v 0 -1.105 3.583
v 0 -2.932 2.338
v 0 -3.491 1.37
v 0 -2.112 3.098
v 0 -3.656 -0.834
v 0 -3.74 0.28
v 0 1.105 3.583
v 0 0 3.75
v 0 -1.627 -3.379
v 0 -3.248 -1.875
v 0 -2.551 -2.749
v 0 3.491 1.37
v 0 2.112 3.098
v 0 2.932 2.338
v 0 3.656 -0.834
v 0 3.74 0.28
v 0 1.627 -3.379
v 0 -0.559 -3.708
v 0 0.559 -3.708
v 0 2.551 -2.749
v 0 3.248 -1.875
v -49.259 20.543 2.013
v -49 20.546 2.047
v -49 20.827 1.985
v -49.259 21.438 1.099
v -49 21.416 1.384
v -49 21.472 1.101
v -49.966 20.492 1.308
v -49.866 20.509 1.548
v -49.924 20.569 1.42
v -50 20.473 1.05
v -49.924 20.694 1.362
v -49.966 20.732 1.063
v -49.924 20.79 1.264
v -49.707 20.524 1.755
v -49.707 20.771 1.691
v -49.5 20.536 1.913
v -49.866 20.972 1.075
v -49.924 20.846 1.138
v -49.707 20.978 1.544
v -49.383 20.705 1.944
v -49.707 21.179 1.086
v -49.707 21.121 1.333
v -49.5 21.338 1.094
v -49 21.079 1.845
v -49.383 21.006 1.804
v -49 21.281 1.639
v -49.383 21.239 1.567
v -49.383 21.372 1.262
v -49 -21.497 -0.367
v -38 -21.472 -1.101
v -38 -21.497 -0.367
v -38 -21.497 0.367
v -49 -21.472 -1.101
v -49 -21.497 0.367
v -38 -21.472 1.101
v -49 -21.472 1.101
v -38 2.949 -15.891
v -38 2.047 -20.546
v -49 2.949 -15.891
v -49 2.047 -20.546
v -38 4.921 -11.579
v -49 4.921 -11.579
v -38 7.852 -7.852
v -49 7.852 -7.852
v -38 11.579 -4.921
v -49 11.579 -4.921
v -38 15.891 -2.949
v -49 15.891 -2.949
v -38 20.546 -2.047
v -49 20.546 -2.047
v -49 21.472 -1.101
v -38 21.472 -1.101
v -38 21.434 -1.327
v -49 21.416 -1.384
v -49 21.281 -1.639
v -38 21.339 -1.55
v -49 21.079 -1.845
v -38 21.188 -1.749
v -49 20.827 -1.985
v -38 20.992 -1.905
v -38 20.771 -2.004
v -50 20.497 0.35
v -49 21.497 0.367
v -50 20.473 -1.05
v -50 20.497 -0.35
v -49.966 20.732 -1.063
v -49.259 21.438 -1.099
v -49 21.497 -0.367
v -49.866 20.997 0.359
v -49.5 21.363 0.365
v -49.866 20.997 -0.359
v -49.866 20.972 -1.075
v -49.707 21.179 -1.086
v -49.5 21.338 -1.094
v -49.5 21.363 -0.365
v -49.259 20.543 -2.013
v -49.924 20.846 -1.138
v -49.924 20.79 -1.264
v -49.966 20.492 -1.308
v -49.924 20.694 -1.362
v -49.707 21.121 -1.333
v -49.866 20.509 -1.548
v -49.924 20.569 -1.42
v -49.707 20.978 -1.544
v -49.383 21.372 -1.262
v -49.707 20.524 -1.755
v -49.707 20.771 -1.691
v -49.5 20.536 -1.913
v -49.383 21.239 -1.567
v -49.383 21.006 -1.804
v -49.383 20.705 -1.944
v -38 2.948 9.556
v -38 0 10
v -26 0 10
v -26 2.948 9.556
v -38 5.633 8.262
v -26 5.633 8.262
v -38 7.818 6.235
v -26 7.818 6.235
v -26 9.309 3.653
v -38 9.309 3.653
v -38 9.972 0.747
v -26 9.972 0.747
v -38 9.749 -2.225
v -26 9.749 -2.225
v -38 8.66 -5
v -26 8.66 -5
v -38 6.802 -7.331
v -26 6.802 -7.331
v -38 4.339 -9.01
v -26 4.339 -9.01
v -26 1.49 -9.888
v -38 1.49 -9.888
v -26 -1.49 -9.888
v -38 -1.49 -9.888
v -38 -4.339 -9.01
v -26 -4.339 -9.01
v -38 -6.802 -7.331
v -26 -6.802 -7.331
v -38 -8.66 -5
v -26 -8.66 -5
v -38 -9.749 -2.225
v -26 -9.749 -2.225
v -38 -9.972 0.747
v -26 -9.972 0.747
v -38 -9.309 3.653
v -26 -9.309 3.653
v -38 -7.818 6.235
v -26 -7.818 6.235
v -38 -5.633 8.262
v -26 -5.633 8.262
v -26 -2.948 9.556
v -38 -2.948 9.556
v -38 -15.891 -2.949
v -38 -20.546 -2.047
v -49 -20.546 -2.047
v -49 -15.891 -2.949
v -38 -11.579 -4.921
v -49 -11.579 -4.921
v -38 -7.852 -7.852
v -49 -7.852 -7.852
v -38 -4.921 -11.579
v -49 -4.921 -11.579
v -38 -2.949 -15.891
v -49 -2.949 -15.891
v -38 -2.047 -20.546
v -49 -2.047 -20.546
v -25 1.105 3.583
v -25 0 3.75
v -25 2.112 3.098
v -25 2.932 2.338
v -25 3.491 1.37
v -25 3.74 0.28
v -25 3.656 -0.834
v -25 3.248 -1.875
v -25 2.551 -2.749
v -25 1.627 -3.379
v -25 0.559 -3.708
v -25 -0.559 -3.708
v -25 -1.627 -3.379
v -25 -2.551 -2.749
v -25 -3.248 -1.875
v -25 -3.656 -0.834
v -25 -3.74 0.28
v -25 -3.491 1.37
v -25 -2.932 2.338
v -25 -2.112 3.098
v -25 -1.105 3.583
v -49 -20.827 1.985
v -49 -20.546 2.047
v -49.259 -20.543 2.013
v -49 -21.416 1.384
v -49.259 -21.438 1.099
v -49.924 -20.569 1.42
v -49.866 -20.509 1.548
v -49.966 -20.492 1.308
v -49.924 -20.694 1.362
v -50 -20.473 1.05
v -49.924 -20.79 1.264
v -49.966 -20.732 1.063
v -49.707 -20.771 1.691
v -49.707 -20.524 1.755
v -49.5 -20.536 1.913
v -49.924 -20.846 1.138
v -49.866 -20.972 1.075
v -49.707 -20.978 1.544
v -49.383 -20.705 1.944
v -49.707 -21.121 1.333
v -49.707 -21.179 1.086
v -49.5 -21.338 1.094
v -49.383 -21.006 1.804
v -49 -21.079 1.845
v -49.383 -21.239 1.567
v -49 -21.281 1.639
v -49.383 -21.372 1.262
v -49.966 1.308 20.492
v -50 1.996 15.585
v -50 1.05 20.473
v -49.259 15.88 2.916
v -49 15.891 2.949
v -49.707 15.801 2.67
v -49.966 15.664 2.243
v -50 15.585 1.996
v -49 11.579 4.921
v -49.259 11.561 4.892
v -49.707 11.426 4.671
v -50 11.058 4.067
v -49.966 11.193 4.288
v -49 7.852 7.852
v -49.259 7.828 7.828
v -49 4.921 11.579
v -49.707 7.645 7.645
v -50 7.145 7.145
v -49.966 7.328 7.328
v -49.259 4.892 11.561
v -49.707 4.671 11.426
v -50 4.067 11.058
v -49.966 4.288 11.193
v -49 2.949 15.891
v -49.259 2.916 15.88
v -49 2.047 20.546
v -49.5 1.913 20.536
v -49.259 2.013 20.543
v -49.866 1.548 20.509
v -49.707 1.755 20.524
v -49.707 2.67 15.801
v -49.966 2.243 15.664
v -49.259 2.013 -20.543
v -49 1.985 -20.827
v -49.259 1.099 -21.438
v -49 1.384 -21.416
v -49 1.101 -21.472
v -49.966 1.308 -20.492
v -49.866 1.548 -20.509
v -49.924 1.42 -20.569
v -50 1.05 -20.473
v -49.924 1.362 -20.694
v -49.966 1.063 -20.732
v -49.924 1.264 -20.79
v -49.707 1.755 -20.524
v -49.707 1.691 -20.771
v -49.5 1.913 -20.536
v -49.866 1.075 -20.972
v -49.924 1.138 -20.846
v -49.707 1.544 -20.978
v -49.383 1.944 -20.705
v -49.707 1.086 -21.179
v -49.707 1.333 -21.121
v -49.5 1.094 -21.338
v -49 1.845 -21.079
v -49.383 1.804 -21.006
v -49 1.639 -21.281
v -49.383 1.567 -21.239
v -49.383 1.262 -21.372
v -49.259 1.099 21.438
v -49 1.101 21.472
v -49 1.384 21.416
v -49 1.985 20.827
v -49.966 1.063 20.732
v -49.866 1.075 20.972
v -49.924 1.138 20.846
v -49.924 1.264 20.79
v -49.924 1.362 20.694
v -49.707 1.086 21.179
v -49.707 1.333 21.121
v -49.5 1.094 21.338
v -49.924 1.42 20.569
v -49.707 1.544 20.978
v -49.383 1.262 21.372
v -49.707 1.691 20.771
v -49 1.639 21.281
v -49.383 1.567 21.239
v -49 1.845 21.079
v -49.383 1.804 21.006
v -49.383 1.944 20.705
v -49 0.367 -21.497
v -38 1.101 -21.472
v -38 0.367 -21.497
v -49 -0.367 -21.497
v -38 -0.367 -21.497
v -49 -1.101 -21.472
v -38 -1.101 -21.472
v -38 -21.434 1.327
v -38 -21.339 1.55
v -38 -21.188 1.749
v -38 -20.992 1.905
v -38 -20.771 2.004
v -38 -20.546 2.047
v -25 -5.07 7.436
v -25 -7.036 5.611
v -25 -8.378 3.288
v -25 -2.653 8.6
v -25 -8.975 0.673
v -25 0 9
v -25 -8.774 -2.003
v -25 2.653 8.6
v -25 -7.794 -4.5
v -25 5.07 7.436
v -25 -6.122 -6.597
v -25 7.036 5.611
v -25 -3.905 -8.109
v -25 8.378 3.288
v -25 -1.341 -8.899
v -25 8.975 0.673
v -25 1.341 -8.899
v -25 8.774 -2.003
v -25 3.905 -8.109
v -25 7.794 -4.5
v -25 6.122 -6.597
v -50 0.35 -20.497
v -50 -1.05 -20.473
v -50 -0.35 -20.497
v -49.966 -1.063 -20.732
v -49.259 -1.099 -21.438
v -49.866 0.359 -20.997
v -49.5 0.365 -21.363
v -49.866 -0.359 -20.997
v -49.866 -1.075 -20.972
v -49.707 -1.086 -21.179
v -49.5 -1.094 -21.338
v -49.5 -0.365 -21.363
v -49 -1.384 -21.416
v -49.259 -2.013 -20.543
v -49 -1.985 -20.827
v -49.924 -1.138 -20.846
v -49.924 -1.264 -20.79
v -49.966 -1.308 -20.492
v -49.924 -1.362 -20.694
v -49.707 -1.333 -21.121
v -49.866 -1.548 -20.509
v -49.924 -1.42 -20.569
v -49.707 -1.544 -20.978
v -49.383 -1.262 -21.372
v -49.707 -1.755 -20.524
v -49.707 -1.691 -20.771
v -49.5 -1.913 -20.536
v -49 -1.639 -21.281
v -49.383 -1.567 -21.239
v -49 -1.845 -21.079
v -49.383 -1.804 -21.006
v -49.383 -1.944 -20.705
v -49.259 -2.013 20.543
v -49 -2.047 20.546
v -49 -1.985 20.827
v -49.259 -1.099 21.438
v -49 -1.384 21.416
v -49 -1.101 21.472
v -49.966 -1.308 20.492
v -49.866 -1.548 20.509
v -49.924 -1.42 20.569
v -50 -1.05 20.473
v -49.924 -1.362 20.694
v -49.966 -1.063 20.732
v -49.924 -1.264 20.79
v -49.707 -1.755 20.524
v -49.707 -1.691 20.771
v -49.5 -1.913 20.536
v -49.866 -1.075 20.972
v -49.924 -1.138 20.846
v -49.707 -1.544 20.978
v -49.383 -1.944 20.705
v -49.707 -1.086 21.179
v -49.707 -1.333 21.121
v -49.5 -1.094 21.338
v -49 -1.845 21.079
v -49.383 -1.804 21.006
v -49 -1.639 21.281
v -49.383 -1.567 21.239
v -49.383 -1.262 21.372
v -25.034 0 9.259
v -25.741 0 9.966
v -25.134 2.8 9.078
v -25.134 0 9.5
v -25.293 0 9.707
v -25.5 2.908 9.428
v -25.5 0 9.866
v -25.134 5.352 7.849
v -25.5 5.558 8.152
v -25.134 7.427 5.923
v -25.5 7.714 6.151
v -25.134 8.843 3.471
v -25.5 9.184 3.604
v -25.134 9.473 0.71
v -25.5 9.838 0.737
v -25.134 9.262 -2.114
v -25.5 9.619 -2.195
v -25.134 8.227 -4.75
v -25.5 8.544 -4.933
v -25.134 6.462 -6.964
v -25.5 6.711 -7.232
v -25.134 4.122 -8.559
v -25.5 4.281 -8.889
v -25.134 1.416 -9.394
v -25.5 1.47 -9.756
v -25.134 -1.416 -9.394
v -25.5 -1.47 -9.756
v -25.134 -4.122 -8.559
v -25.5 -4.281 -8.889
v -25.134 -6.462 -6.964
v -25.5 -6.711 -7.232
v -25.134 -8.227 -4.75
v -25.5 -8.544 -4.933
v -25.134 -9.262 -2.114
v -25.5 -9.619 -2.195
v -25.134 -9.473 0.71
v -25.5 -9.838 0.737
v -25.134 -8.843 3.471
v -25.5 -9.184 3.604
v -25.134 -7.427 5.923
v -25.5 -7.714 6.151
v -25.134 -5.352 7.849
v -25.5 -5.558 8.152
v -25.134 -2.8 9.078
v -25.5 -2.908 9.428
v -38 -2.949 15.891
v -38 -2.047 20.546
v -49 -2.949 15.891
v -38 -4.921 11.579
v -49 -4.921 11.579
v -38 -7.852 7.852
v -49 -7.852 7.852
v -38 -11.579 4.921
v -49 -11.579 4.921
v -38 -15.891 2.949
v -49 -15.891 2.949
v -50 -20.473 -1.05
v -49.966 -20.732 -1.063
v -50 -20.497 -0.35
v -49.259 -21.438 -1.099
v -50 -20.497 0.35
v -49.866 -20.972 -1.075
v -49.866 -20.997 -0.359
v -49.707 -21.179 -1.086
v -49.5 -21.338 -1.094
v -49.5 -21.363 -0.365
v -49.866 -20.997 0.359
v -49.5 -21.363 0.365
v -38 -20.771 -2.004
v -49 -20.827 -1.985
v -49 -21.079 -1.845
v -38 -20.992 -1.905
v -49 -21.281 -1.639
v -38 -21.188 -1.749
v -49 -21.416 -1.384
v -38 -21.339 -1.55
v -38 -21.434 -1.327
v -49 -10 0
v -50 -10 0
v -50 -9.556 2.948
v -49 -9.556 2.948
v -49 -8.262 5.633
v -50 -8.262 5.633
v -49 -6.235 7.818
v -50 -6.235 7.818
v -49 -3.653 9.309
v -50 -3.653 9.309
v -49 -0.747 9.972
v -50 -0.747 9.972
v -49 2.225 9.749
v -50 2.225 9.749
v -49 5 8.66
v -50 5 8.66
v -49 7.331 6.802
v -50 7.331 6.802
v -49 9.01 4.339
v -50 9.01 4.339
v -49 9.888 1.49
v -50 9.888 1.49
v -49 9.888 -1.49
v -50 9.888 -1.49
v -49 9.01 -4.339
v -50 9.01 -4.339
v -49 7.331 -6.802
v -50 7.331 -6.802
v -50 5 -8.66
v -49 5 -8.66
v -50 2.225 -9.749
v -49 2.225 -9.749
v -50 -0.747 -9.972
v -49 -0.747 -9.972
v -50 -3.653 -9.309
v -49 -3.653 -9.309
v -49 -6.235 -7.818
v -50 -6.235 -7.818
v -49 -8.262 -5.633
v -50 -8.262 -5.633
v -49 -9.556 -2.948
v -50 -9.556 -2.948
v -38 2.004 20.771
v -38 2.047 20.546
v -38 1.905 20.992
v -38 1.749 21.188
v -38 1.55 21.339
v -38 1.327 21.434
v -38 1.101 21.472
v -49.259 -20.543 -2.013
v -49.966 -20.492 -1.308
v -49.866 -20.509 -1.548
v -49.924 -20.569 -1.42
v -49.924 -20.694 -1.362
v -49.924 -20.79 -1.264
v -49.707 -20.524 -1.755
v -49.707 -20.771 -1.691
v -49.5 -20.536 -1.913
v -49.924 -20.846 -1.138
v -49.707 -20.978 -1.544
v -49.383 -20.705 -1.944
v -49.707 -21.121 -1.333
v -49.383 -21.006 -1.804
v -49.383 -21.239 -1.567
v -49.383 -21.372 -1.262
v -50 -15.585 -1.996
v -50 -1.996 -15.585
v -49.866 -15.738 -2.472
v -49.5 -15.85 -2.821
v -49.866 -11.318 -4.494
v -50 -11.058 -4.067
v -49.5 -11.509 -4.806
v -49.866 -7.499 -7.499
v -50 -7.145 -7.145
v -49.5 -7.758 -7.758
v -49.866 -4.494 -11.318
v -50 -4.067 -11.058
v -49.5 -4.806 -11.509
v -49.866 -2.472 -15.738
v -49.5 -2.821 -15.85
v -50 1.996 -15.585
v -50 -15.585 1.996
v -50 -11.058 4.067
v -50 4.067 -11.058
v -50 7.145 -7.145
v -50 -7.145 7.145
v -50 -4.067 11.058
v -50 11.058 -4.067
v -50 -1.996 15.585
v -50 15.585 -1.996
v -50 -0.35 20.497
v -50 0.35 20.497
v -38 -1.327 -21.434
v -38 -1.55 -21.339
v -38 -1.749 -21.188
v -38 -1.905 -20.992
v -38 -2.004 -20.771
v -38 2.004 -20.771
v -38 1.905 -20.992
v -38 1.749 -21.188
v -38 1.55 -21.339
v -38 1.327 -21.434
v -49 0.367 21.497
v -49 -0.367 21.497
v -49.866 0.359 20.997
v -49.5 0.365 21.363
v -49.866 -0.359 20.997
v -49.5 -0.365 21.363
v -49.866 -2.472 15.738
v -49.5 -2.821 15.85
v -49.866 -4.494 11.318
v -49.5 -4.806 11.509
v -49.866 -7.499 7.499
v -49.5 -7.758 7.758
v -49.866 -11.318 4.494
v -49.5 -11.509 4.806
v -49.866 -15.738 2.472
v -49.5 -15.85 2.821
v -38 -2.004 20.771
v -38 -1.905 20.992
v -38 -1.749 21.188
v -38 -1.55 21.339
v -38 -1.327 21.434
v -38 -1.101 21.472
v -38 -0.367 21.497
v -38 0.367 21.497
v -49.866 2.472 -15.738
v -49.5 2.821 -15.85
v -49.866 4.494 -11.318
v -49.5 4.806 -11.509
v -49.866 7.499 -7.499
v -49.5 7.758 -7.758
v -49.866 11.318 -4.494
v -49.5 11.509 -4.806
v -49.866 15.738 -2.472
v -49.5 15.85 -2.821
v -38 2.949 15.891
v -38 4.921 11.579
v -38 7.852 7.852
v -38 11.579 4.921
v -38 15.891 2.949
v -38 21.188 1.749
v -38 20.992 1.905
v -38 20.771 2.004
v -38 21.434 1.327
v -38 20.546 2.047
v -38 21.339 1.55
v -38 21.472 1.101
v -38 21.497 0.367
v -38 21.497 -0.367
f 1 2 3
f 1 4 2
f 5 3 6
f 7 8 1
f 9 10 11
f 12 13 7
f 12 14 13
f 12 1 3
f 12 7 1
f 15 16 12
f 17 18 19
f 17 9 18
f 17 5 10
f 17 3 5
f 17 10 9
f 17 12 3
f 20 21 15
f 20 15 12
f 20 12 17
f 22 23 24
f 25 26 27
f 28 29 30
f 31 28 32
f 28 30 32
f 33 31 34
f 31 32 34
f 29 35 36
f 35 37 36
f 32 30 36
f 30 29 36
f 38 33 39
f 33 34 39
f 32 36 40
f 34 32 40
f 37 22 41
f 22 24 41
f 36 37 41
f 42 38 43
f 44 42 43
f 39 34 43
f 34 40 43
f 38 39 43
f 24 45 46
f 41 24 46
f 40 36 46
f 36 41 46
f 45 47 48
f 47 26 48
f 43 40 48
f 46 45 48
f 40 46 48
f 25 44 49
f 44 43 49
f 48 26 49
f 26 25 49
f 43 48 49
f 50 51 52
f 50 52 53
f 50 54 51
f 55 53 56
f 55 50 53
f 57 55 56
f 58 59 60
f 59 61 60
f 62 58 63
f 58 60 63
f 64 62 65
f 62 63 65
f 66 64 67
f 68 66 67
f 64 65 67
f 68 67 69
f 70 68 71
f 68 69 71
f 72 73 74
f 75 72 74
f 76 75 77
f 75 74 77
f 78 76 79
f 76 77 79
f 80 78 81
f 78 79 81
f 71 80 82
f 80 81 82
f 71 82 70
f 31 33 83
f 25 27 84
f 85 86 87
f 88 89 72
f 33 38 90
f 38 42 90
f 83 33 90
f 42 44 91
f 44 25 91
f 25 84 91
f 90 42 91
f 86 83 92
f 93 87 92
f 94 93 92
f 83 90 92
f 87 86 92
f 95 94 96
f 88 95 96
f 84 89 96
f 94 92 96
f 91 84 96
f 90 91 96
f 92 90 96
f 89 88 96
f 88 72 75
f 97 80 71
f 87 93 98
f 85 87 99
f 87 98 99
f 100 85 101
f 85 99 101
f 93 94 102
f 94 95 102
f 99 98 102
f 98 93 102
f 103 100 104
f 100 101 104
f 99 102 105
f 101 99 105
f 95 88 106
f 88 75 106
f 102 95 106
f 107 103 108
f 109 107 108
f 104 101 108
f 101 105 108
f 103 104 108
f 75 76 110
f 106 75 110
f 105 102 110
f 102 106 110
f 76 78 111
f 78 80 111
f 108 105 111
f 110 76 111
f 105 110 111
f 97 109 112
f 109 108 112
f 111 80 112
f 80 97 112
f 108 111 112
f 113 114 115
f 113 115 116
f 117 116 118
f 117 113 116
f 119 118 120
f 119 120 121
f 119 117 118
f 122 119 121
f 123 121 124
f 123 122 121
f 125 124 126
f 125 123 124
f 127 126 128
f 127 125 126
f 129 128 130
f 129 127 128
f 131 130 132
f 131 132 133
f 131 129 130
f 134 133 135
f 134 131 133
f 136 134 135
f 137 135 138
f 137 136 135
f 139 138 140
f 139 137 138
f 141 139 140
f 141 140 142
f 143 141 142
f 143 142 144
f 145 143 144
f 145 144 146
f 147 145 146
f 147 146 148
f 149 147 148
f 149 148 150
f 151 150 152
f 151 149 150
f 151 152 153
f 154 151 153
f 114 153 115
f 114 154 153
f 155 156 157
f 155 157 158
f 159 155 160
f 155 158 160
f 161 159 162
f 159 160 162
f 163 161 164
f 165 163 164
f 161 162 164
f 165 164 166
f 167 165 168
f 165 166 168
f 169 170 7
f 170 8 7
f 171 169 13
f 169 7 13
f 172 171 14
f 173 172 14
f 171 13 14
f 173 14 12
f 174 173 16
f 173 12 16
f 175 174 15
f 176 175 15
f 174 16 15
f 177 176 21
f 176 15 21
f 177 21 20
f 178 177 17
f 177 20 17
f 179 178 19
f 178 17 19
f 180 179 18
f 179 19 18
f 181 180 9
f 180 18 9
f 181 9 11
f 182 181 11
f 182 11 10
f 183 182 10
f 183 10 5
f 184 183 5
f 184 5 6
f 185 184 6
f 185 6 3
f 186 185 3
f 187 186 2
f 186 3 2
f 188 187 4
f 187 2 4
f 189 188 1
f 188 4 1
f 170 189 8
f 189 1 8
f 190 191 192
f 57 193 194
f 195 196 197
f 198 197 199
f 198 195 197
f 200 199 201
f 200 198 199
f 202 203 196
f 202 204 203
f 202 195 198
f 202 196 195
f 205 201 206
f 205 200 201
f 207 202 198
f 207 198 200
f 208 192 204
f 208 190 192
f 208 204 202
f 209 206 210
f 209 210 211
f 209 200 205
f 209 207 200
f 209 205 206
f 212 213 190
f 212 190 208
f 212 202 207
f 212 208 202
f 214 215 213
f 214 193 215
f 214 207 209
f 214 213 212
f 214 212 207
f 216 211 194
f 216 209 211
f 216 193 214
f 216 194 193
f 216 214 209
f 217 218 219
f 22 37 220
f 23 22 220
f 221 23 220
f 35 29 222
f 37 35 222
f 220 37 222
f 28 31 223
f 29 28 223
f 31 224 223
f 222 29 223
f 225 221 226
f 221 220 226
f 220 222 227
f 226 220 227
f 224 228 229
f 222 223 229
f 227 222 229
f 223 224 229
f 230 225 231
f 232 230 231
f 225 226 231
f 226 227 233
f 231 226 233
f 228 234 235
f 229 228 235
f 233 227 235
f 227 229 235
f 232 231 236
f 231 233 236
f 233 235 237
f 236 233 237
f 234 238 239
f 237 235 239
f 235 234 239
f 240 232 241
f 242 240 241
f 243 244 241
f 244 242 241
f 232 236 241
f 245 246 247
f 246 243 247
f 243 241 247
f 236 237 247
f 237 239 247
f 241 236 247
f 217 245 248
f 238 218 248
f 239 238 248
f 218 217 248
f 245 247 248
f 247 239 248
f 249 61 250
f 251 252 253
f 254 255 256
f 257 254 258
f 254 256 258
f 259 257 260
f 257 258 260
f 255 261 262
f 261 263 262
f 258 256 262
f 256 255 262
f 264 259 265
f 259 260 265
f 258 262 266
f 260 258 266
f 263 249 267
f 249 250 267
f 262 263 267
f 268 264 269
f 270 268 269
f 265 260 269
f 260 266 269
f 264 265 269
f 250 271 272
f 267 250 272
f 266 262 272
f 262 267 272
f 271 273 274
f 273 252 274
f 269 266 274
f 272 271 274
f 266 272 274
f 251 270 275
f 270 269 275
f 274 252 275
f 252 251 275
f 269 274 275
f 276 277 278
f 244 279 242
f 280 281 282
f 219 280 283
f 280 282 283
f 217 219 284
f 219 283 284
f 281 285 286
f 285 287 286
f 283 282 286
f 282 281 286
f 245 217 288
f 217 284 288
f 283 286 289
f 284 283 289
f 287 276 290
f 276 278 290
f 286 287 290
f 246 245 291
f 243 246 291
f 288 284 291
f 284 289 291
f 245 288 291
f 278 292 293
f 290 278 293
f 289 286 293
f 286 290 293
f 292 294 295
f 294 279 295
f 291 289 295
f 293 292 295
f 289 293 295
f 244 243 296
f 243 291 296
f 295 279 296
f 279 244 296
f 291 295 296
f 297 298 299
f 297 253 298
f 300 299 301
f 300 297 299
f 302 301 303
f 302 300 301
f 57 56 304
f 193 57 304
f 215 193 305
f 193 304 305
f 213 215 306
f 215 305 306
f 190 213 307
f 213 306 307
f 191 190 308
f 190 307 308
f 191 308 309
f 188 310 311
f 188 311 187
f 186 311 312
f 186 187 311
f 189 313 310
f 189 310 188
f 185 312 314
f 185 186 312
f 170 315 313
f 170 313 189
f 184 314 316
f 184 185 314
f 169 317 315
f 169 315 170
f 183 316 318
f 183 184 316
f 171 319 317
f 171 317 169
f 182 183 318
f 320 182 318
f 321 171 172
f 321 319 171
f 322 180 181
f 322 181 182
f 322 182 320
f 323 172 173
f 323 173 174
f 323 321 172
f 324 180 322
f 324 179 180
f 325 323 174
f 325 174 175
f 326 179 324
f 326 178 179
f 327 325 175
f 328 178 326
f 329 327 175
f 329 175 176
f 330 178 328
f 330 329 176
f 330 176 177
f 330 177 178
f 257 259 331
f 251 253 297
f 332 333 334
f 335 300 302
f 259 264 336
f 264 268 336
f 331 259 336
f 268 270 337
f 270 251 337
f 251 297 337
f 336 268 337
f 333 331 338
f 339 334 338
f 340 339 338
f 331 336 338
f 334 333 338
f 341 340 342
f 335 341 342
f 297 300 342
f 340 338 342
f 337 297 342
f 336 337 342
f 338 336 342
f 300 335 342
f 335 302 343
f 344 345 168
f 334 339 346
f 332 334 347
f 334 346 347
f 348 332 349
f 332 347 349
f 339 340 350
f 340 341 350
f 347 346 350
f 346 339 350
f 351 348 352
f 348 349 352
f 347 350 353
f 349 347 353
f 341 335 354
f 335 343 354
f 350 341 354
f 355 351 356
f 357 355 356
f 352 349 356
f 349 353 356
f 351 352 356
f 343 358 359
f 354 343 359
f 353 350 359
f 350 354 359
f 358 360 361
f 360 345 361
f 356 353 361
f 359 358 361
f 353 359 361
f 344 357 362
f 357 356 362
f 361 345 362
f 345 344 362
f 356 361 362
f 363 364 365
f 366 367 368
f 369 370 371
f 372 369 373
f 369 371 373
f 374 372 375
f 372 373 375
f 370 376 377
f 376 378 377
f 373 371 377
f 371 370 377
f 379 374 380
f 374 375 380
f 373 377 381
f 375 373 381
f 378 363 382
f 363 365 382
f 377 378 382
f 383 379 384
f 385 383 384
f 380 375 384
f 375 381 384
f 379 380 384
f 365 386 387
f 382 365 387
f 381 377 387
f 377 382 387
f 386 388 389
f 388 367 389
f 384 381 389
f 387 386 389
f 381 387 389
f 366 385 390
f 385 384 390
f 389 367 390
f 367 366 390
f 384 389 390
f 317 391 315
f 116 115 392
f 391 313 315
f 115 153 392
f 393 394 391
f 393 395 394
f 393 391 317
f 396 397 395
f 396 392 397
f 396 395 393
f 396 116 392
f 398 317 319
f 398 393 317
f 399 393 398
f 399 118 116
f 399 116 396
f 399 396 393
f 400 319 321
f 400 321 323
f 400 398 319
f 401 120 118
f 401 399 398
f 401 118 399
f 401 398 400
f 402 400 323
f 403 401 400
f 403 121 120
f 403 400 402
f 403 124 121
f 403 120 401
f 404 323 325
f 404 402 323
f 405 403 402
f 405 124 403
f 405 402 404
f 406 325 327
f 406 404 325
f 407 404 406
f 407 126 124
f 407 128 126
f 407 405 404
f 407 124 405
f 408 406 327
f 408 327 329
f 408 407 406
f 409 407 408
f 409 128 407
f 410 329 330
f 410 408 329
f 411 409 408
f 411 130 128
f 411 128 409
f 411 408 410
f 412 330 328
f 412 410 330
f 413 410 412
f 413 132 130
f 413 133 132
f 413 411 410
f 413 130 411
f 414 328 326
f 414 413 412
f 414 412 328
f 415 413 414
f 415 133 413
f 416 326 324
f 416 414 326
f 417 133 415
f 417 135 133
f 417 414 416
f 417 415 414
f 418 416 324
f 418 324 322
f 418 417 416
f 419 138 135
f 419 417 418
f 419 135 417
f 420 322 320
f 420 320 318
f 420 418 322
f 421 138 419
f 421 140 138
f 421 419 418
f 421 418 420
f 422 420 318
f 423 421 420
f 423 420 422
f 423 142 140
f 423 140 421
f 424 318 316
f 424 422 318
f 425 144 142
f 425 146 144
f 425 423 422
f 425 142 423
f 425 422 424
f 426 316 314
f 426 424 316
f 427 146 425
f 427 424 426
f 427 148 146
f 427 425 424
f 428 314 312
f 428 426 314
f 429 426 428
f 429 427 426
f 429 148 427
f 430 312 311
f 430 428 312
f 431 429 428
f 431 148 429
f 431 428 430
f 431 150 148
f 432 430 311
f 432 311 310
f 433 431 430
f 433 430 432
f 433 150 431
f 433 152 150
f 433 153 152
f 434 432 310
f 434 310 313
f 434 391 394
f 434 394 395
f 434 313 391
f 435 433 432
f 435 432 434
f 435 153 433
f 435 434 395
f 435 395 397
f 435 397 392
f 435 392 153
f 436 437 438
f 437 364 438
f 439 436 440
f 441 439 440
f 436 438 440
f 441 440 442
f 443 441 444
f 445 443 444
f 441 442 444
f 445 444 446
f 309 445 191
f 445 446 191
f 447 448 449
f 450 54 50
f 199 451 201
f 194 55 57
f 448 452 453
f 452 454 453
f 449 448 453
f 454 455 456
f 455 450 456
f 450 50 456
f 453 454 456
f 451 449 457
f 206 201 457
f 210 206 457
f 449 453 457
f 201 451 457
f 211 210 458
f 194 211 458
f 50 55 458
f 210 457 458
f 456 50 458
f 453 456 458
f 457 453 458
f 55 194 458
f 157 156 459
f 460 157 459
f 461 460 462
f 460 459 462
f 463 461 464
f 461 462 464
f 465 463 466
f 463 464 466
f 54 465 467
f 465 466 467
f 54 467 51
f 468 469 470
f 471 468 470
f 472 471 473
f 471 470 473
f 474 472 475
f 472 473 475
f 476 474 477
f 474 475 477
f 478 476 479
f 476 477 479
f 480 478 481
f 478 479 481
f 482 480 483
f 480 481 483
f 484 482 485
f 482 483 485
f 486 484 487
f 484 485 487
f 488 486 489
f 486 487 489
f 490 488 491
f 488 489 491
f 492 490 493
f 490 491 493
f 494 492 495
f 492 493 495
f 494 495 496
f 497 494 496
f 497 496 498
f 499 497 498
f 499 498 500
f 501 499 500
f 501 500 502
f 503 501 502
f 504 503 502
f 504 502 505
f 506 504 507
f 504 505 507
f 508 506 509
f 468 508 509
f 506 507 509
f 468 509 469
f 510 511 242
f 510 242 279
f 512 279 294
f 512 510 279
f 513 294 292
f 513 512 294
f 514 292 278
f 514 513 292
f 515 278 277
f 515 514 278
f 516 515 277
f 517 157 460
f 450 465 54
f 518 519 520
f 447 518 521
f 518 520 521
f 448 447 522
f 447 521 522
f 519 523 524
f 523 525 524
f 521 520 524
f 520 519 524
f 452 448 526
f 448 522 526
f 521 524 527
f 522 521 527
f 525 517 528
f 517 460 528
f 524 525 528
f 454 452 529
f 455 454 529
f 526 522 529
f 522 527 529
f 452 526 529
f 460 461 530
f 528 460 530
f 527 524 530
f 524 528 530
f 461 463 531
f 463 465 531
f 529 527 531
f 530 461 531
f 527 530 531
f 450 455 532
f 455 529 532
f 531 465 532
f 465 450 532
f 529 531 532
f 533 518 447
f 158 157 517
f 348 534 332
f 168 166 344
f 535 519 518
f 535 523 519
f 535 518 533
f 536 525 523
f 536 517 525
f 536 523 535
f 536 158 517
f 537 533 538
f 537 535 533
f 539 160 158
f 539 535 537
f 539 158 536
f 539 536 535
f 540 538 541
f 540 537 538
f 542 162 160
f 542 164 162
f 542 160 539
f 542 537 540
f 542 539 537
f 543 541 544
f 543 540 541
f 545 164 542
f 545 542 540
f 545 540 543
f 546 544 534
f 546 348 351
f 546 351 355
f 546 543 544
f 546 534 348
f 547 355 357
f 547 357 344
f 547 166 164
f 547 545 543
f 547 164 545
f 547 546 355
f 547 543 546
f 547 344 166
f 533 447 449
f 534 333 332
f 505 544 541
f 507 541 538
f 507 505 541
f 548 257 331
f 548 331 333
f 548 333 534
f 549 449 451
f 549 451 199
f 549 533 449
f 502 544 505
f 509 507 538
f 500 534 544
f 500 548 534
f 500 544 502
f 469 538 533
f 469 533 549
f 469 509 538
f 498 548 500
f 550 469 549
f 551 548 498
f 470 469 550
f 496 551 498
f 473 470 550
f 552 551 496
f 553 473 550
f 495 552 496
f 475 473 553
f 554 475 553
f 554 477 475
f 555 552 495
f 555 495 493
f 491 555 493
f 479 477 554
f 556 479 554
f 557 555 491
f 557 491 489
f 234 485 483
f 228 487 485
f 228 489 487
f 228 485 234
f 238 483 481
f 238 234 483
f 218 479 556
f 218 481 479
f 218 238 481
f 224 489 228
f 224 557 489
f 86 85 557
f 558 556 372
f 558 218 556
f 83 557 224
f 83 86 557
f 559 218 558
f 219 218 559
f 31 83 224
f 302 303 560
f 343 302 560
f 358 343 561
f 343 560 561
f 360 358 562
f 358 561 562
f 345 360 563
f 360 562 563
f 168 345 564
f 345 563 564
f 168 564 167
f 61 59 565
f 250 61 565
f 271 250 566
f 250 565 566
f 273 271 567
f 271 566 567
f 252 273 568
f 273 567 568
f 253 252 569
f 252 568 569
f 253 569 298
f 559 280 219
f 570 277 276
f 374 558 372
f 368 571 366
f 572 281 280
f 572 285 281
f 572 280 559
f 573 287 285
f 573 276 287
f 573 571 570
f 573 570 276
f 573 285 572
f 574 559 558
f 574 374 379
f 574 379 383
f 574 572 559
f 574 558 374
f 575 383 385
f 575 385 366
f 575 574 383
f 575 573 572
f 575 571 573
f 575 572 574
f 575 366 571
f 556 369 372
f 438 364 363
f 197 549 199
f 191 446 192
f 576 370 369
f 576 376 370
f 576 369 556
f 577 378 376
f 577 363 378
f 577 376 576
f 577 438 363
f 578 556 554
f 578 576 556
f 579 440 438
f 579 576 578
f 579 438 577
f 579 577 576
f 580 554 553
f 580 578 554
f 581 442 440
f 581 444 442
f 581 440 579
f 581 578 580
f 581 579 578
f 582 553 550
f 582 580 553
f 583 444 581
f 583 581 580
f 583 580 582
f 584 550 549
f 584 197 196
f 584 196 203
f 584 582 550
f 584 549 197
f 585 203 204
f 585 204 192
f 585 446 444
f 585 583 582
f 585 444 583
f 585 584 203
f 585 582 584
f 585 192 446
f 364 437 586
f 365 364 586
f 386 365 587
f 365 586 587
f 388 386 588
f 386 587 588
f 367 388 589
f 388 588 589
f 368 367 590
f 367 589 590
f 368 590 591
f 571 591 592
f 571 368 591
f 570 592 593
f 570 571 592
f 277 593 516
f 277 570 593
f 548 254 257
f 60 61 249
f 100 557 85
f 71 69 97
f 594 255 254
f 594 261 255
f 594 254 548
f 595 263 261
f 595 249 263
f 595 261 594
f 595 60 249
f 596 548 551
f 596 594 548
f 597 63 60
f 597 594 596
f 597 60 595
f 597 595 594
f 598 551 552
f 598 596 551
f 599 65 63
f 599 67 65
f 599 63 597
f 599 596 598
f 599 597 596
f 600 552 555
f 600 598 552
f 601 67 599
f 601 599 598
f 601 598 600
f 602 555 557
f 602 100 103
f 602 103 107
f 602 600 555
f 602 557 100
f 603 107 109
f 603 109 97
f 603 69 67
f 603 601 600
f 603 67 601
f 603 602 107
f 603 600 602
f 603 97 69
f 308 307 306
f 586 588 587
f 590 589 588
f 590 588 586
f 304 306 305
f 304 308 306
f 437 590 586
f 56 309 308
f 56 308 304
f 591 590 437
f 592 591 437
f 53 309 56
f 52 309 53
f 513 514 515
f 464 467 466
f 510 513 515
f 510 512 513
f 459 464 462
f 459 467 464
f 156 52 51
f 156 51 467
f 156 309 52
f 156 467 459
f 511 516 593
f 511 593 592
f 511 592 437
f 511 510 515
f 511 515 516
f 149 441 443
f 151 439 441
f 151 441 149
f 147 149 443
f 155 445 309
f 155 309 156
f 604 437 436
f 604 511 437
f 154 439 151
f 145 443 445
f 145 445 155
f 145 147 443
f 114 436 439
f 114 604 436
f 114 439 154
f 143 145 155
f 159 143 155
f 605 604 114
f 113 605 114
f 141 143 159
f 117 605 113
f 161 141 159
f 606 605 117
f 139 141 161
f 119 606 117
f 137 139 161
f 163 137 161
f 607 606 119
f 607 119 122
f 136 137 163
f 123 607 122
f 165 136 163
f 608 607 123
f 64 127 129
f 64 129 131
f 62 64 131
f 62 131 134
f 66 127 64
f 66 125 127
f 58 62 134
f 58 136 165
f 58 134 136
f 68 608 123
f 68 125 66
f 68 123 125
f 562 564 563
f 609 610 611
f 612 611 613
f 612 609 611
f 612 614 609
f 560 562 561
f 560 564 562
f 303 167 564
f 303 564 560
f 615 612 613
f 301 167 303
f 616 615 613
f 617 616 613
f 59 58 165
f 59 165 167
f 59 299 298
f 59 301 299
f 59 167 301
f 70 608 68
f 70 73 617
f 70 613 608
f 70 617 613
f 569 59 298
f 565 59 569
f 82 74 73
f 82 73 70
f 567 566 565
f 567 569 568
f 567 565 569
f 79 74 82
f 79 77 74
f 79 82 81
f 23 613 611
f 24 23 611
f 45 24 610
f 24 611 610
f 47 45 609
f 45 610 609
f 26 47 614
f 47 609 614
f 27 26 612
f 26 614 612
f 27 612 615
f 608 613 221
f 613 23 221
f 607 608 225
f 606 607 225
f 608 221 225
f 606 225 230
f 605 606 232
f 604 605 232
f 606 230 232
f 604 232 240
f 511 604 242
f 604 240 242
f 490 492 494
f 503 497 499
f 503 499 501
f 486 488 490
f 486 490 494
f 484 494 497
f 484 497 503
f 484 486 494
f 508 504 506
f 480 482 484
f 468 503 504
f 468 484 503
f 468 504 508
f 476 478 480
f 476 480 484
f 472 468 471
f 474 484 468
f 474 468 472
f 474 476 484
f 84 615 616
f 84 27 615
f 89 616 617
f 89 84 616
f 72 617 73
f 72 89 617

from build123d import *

# Parameters (mm, degrees)
F0_W     = 25
F0_H     = 3.75
F3_DEPTH = 50.001
F4_R     = 1
F2_R     = 10
F5_DEPTH = 1


with BuildPart() as f1:
    # F0 (on Front) → F1 (revolve)
    with BuildSketch(Plane.XZ):
        Polygon((-50, 0), (-38, 0), (-38, 10), (-38, 21.5), (-50, 21.5), align=None)
        Polygon((-38, 0), (-25, 0), (-25, 3.75), (-25, 10), (-38, 10), align=None)
        with Locations((-12.5, 1.875)):
            Rectangle(F0_W, F0_H)
    revolve(axis=Axis((-31.744454056, 0, 0), (-1, 0, 0)))

    # F2 (on face) → F3 (cut, through all)
    with BuildSketch(Plane(origin=(-50, 0, 0), x_dir=(0, -1, 0), z_dir=(-1, 0, 0))):
        with BuildLine():
            ThreePointArc((-21.4064859646, 2.0030872791), (-7.8523074483, 7.8523074483), (-2.0030872791, 21.4064859646))
            ThreePointArc((-2.0030872791, 21.4064859646), (-15.2027957955, 15.2027957955), (-21.4064859646, 2.0030872791))
        make_face()
        with BuildLine():
            ThreePointArc((2.0030872791, 21.4064859646), (7.8523074483, 7.8523074483), (21.4064859646, 2.0030872791))
            ThreePointArc((21.4064859646, 2.0030872791), (15.2027957955, 15.2027957955), (2.0030872791, 21.4064859646))
        make_face()
        with BuildLine():
            ThreePointArc((-21.4064859646, -2.0030872791), (-15.2027957955, -15.2027957955), (-2.0030872791, -21.4064859646))
            ThreePointArc((-2.0030872791, -21.4064859646), (-7.8523074483, -7.8523074483), (-21.4064859646, -2.0030872791))
        make_face()
        with BuildLine():
            ThreePointArc((2.0030872791, -21.4064859646), (15.2027957955, -15.2027957955), (21.4064859646, -2.0030872791))
            ThreePointArc((21.4064859646, -2.0030872791), (7.8523074483, -7.8523074483), (2.0030872791, -21.4064859646))
        make_face()
    extrude(amount=-F3_DEPTH, mode=Mode.SUBTRACT)

    # F4
    f4_edges = [f1.edges().sort_by_distance(p)[0] for p in [
        (-50, -7.852307, 7.852307),
        (-50, 0, 21.5),
        (-50, 7.852307, 7.852307),
        (-50, 21.5, 0),
        (-50, 7.852307, -7.852307),
        (-50, 0, -21.5),
        (-50, -7.852307, -7.852307),
        (-50, -21.5, 0),
        (-44, -2.003087, -21.406486),
        (-44, 21.406486, -2.003087),
        (-44, -21.406486, -2.003087),
        (-44, -2.003087, 21.406486),
        (-44, -21.406486, 2.003087),
        (-44, 2.003087, 21.406486),
        (-44, 21.406486, 2.003087),
        (-44, 2.003087, -21.406486),
        (-25, 0, -10),
    ]]
    fillet(f4_edges, radius=F4_R)

    # F2 (on face) → F5 (cut)
    with BuildSketch(Plane(origin=(-50, 0, 0), x_dir=(0, -1, 0), z_dir=(-1, 0, 0))):
        Circle(F2_R)
    extrude(amount=-F5_DEPTH, mode=Mode.SUBTRACT)


solid = f1.part
